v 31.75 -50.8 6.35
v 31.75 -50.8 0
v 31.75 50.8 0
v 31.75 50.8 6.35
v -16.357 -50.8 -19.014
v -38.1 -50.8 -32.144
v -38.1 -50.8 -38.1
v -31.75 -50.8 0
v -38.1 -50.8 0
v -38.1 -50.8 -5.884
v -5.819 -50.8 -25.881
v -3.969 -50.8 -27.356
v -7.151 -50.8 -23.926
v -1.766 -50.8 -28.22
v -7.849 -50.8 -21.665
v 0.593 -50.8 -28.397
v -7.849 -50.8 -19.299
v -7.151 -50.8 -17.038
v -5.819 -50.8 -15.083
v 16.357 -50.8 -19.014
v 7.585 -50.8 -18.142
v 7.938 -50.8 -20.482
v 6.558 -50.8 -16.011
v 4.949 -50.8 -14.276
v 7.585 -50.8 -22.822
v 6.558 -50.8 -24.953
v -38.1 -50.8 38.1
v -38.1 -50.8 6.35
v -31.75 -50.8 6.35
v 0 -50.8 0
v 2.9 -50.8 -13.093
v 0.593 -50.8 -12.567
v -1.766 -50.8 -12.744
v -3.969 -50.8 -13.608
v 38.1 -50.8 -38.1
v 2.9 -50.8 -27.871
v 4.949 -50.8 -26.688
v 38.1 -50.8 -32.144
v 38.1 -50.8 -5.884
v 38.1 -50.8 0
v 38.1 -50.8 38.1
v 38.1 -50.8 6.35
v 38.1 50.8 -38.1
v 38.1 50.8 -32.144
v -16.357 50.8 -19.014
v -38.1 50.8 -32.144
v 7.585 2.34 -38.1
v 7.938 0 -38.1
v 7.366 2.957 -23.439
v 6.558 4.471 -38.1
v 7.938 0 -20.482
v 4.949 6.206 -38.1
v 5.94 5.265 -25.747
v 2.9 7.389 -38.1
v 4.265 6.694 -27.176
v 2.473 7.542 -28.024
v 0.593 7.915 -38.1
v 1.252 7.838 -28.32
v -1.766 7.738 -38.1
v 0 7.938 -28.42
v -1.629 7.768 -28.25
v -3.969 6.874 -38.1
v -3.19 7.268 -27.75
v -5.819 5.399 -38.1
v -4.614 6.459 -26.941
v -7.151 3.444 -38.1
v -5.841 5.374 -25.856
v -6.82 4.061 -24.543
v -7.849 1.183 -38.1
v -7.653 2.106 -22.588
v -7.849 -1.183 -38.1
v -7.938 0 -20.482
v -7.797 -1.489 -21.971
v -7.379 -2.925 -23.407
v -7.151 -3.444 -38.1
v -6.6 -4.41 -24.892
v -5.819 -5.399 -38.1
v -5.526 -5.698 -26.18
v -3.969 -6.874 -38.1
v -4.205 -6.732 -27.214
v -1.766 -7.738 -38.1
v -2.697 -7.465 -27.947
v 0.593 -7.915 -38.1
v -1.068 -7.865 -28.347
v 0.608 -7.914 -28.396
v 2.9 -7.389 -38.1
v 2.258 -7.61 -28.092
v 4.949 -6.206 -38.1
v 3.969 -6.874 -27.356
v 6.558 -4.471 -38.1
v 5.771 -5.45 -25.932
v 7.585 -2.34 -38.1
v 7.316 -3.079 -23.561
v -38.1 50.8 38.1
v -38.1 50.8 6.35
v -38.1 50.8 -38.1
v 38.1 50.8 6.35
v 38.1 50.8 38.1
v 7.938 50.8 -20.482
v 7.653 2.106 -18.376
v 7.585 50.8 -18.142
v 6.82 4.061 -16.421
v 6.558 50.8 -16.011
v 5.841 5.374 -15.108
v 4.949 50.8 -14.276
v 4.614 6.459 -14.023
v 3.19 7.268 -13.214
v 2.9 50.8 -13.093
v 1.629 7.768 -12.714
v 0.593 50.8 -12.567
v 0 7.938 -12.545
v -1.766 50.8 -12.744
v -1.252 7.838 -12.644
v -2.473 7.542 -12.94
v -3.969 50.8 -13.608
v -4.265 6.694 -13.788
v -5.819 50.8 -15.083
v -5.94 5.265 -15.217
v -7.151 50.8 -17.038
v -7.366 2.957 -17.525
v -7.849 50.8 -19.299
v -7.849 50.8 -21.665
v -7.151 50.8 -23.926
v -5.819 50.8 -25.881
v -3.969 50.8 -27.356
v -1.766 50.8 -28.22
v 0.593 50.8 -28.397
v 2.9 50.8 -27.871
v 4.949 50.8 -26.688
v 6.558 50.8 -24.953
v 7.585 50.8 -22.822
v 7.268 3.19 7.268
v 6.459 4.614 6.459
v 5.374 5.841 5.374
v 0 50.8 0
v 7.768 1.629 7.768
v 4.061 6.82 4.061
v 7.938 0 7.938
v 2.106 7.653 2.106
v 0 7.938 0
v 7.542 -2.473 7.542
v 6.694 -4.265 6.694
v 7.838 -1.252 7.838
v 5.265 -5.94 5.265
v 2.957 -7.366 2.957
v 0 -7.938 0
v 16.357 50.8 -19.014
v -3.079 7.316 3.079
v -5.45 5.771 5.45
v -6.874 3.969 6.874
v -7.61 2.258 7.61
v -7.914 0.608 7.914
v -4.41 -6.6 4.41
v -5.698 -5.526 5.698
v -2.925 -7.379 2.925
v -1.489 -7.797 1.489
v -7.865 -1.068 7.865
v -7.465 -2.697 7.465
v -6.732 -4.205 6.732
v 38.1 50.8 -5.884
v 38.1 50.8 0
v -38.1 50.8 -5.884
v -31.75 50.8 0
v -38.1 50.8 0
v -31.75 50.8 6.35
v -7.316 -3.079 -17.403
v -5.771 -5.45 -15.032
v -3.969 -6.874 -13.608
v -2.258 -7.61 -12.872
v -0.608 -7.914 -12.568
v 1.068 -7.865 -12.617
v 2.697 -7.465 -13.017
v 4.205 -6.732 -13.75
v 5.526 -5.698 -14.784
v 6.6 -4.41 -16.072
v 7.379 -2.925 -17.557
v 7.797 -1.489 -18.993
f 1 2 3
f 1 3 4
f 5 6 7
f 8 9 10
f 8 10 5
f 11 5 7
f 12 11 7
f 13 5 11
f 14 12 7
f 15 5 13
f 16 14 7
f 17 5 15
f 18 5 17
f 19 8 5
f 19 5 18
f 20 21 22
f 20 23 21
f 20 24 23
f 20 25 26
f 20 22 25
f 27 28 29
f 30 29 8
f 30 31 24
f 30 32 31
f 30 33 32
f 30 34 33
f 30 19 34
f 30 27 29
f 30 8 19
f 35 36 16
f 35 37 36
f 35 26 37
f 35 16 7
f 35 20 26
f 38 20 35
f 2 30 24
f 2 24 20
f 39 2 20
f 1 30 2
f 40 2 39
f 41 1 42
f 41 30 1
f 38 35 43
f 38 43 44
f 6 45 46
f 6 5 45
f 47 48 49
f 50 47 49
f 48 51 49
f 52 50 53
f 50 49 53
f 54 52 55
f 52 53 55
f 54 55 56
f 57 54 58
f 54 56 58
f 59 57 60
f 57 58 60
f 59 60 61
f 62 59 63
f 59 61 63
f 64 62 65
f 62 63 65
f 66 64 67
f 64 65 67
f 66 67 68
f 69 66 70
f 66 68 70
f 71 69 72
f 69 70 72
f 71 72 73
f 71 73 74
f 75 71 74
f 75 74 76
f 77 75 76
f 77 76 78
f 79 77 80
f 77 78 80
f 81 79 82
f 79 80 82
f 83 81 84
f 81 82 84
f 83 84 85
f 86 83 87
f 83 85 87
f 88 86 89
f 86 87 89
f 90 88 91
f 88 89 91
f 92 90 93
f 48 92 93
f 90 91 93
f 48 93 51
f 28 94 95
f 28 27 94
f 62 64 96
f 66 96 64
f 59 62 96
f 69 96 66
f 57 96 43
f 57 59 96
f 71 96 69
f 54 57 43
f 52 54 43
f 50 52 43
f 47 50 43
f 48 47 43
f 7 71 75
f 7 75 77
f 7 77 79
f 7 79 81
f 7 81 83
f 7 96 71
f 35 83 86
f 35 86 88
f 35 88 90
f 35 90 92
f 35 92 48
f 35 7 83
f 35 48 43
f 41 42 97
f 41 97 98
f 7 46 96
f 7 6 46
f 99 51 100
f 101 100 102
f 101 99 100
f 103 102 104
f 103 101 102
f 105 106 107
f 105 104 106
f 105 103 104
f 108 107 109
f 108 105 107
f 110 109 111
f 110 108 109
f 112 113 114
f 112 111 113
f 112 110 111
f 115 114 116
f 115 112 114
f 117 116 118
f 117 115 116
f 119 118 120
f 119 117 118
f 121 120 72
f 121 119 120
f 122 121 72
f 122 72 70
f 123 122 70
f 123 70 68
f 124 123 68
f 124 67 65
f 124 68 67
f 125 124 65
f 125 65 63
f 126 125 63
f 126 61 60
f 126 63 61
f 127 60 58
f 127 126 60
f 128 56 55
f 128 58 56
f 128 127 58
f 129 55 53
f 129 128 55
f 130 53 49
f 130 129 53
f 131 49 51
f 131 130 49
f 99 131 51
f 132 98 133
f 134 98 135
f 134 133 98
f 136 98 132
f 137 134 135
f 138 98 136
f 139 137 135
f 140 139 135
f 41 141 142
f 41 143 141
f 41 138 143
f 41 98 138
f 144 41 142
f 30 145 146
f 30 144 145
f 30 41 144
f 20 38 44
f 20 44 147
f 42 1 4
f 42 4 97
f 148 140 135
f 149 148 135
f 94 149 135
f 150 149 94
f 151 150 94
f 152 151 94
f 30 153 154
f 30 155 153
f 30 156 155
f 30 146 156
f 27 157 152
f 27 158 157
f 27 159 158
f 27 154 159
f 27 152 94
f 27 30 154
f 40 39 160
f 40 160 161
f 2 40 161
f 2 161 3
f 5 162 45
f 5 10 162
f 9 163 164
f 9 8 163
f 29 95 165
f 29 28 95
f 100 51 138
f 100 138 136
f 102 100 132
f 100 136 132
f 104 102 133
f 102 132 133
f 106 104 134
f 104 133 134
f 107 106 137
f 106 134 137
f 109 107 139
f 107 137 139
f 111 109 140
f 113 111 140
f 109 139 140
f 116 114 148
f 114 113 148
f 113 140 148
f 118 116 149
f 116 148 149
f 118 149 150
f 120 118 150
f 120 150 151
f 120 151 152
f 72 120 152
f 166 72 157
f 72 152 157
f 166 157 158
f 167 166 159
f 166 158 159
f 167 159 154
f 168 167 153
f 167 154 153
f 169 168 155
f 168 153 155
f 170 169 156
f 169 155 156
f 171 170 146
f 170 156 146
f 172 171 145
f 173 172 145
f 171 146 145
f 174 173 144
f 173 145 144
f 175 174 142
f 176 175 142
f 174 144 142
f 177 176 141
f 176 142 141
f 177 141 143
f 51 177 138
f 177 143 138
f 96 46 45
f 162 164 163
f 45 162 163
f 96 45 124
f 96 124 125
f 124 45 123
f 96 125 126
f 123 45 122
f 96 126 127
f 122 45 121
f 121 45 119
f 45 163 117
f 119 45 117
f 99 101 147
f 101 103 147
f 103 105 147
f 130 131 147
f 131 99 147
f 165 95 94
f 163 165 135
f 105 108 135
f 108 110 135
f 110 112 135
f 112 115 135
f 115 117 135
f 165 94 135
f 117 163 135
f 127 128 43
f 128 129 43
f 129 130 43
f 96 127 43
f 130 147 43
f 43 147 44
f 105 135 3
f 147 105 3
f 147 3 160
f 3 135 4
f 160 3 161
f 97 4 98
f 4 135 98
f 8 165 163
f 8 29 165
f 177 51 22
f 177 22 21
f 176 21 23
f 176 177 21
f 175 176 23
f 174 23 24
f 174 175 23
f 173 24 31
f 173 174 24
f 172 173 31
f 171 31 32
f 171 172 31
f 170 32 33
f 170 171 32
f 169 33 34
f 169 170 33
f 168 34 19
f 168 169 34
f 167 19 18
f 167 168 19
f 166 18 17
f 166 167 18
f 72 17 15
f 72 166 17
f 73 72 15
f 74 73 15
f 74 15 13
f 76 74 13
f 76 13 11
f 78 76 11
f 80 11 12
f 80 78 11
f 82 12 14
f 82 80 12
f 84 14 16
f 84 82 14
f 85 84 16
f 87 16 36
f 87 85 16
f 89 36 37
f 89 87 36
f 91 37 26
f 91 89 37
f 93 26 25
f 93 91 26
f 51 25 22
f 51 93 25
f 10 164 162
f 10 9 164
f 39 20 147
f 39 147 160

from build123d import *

# Parameters (mm, degrees)
F0_R     = 7.9375
F1_DEPTH = 50.8
F2_R     = 7.9375
F3_DEPTH = 50.8


with BuildPart() as f1:
    # F0 (on Front) → F1 (new body, symmetric)
    with BuildSketch(Plane.XZ):
        Polygon((-38.1, -32.143515), (-38.1, -38.1), (38.1, -38.1), (38.1, -32.143515), (16.356649, -19.013904), (38.1, -5.884292), (38.1, 0), (31.75, 0), (31.75, 6.35), (38.1, 6.35), (38.1, 38.1), (0, 0), (-38.1, 38.1), (-38.1, 6.35), (-31.75, 6.35), (-31.75, 0), (-38.1, 0), (-38.1, -5.884292), (-16.356649, -19.013904), align=None)
        with Locations((0, -20.482006)):
            Circle(F0_R, mode=Mode.SUBTRACT)
    extrude(amount=F1_DEPTH, both=True)

    # F2 (on Top) → F3 (cut, symmetric)
    with BuildSketch(Plane.XY):
        Circle(F2_R)
    extrude(amount=F3_DEPTH, both=True, mode=Mode.SUBTRACT)


solid = f1.part
